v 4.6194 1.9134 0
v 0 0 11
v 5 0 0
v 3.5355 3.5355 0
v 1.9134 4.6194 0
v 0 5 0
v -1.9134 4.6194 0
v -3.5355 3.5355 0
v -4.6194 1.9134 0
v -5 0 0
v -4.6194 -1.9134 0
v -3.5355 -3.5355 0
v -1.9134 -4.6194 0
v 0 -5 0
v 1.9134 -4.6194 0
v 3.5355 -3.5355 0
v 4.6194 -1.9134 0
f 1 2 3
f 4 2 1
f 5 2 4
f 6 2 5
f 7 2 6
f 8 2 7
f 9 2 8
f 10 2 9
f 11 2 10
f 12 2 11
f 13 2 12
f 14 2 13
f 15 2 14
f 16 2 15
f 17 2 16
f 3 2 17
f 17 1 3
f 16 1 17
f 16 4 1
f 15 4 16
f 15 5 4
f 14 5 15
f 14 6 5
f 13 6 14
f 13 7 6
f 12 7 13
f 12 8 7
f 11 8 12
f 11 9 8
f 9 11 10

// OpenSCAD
// Generated by SolidPython 1.0.1 on 2020-07-29 00:46:43


cylinder(h = 11, r1 = 5, r2 = 0);
/***********************************************
*********      SolidPython code:      **********
************************************************
 
# import packages: SolidPython
from solid import *
from solid.utils import *
from itertools import chain, combinations, permutations


class Resize:

    def __init__(self, scad_file):
        self.scad_file = scad_file
        #self.scad_file = import_scad(scad_file)
        # cone/cylinder param:
        self.r1 = 0
        self.r2 = 0
        self.h = 0
        # rectangular prism param:
        self.w = 0
        self.l = 0
        # ellipse param:
        self.r = 0

    # import OpenScad code (file name corresponds to shape)


    # classify shape + parameters
    def assign(self, param1, param2, param3):
        if self.scad_file == 'cone.scad':
            self.r1 = param1
            self.r2 = param2
            self.h = param3
        elif self.scad_file == 'cylinder.scad':
            self.r1 = param1
            self.r2 = param2
            self.h = param3
        elif self.scad_file == 'rectangularPrism.scad':
            self.h = param1
            self.l = param2
            self.w = param3
        else:
            self.r = param1
            self.h = param2

    # resize parameters
    def iterate(self):
        x = range(3, 20, 2)
        i = 1
        if self.scad_file == 'cone.scad':
            tempList = list(permutations(x, 2))
            for temp in tempList:
                param1 = temp[0]
                param2 = temp[1]
                filepath = 'produced_scad_files/' + 'cone' + str(param1) + '_' + str(param2) + '_' + '.scad'
                scad_render_to_file(cylinder(h=param1, r1=param2, r2=0), filepath)

        elif self.scad_file == 'cylinder.scad':
            tempList = list(permutations(x, 3))
            for temp in tempList:
                param1 = temp[0]
                param2 = temp[1]
                filepath = 'produced_scad_files/' + 'cylinder' + str(param1) + '_' + str(param2) + '_' + '.scad'
                scad_render_to_file(cylinder(h=param1, r1=param2, r2=param2), filepath)

        elif self.scad_file == 'rectangularPrism.scad':
            tempList = list(permutations(x, 3))
            for temp in tempList:
                param1 = temp[0]
                param2 = temp[1]
                param3 = temp[2]
                filepath = 'produced_scad_files/' + 'rectangularPrism' + str(param1) + '_' + str(param2) + '_' + str(
                    param3) + '.scad'
                scad_render_to_file(cube(size=(param1, param2, param3)), filepath)

        elif self.scad_file == 'ellipse.scad':
            tempList = list(permutations(x, 4))
            for temp in tempList:
                param1 = temp[0]
                param2 = temp[1]
                param3 = temp[2]
                param4 = temp[3]
                filepath = 'produced_scad_files/' + 'ellipse' + str(param1) + '_' + str(param2) + '_' + str(param3) + '_' + str(param4) + '.scad'
                scad_render_to_file(scale([param1, param2, param3])(sphere(r=param4)), filepath)

    def render_to_scadfile(self):
        scad_render_to_file(scad, 'example.scad') 
 
************************************************/
